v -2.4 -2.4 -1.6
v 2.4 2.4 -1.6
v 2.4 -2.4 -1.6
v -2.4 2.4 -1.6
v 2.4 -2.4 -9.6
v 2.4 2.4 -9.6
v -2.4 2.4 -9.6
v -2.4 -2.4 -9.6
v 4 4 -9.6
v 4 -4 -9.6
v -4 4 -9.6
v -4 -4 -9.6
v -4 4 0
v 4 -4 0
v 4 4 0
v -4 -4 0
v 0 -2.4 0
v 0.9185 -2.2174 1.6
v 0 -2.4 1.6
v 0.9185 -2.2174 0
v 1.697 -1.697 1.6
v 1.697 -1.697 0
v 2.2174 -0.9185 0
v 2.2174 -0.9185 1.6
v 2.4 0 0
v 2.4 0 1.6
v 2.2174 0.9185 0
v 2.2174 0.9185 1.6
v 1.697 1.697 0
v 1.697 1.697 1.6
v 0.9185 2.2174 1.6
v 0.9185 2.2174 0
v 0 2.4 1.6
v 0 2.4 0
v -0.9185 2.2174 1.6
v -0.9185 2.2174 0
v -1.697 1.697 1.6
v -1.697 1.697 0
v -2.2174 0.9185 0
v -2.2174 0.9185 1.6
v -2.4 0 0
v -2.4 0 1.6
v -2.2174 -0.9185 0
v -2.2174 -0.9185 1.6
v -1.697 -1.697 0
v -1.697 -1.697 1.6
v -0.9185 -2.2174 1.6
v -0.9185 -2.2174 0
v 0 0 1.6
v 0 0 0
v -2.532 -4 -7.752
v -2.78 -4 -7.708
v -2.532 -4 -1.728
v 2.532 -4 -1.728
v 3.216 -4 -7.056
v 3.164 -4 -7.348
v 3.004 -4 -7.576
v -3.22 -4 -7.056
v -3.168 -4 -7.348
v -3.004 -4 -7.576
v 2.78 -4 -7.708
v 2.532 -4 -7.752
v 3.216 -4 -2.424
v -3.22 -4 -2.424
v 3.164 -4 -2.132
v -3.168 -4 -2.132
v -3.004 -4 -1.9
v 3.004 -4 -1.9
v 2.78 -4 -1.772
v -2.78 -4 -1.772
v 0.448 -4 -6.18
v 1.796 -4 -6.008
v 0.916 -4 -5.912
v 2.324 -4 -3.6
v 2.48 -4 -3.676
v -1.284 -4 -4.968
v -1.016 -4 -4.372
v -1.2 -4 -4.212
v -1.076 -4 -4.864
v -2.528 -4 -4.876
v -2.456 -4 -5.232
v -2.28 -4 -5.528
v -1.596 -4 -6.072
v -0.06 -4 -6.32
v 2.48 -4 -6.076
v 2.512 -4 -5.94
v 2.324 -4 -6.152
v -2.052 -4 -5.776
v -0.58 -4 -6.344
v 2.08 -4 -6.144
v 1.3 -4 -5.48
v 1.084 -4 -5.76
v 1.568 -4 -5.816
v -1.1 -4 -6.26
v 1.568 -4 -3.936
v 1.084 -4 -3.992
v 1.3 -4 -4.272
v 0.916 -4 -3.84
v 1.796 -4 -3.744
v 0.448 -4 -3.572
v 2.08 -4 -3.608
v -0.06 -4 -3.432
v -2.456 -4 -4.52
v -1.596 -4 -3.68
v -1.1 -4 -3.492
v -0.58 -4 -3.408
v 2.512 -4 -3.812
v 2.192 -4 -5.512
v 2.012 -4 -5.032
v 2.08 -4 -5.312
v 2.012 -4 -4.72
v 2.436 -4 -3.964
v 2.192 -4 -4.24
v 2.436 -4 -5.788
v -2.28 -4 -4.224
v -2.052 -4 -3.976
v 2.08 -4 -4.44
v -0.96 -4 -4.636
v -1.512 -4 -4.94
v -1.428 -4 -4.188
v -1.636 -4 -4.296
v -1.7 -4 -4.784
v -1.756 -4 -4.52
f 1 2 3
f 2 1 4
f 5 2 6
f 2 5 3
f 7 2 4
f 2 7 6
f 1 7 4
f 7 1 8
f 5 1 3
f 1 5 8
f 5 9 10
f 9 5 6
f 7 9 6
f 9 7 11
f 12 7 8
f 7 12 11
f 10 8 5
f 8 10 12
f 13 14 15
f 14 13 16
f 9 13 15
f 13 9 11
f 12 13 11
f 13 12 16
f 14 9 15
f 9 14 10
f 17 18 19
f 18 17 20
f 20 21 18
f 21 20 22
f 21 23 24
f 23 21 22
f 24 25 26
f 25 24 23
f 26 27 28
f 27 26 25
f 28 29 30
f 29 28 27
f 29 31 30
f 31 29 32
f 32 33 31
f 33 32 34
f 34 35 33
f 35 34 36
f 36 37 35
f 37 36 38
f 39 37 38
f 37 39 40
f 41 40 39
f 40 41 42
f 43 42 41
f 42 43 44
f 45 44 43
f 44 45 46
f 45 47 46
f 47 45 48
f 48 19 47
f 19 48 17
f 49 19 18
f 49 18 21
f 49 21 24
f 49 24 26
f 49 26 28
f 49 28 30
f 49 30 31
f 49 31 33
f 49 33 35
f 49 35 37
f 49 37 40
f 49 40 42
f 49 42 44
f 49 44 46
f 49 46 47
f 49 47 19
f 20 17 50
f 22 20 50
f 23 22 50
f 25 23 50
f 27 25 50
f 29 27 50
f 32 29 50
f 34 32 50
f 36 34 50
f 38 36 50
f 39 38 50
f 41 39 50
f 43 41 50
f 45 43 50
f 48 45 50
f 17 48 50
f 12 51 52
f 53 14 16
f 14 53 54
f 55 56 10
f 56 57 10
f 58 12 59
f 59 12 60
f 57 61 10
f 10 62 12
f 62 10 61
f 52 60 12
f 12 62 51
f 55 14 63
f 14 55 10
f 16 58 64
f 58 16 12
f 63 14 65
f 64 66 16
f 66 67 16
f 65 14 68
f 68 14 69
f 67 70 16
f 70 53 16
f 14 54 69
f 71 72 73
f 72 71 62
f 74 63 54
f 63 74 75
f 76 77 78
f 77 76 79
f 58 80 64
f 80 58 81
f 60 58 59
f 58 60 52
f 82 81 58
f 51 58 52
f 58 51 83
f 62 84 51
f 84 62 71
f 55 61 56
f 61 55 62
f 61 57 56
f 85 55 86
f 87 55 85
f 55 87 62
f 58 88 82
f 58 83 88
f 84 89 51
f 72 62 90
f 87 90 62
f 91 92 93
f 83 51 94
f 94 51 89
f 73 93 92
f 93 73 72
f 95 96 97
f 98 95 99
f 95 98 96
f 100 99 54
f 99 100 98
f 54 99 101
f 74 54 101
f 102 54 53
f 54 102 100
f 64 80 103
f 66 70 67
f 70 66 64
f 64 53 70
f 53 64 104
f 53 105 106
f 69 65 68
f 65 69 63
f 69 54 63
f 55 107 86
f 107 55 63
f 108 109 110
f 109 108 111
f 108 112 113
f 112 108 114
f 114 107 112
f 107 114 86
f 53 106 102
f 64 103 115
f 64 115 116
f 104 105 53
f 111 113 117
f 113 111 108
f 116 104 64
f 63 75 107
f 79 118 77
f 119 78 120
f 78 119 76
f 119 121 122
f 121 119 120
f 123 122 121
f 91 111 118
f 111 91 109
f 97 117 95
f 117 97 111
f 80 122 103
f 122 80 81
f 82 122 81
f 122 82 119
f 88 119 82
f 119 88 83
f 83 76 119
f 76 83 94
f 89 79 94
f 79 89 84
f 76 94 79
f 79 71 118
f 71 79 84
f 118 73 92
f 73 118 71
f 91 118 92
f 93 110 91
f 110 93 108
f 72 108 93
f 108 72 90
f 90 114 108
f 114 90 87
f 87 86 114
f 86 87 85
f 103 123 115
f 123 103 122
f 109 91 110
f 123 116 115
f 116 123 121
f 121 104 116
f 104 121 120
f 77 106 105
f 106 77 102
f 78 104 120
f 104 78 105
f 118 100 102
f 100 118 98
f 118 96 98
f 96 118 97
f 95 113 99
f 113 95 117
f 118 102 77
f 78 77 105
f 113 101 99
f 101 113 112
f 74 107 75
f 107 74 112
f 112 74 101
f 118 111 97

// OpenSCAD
// file: ../p/4-4edge.scad
use <../lib.scad>
function ldraw_lib__4_4edge() = [
// 0 Circle 1.0
// 0 Name: 4-4edge.dat
// 0 Author: James Jessiman
// 0 !LDRAW_ORG Primitive UPDATE 2017-01
// 0 !LICENSE Licensed under CC BY 2.0 and CC BY 4.0 : see CAreadme.txt
// 
// 0 BFC CERTIFY CCW
  [0,"BFC","CERTIFY"],
  [0,"BFC","CCW"],
// 
// 0 !HISTORY 1998-12-15 [PTadmin] Official Update 1998-10
// 0 !HISTORY 2005-12-28 [PTadmin] Official Update 2005-01
// 0 !HISTORY 2007-06-24 [PTadmin] Header formatted for Contributor Agreement
// 0 !HISTORY 2008-07-01 [PTadmin] Official Update 2008-01
// 0 !HISTORY 2017-01-15 [Steffen] BFCed
// 0 !HISTORY 2017-12-30 [PTadmin] Official Update 2017-01
// 
// 
// 2 24 1 0 0 0.9239 0 0.3827
  [2,24,1,0,0,0.9239,0,0.3827],
// 2 24 0.9239 0 0.3827 0.7071 0 0.7071
  [2,24,0.9239,0,0.3827,0.7071,0,0.7071],
// 2 24 0.7071 0 0.7071 0.3827 0 0.9239
  [2,24,0.7071,0,0.7071,0.3827,0,0.9239],
// 2 24 0.3827 0 0.9239 0 0 1
  [2,24,0.3827,0,0.9239,0,0,1],
// 2 24 0 0 1 -0.3827 0 0.9239
  [2,24,0,0,1,-0.3827,0,0.9239],
// 2 24 -0.3827 0 0.9239 -0.7071 0 0.7071
  [2,24,-0.3827,0,0.9239,-0.7071,0,0.7071],
// 2 24 -0.7071 0 0.7071 -0.9239 0 0.3827
  [2,24,-0.7071,0,0.7071,-0.9239,0,0.3827],
// 2 24 -0.9239 0 0.3827 -1 0 -0
  [2,24,-0.9239,0,0.3827,-1,0,-0],
// 2 24 -1 0 -0 -0.9239 0 -0.3827
  [2,24,-1,0,-0,-0.9239,0,-0.3827],
// 2 24 -0.9239 0 -0.3827 -0.7071 0 -0.7071
  [2,24,-0.9239,0,-0.3827,-0.7071,0,-0.7071],
// 2 24 -0.7071 0 -0.7071 -0.3827 0 -0.9239
  [2,24,-0.7071,0,-0.7071,-0.3827,0,-0.9239],
// 2 24 -0.3827 0 -0.9239 0 0 -1
  [2,24,-0.3827,0,-0.9239,0,0,-1],
// 2 24 0 0 -1 0.3827 0 -0.9239
  [2,24,0,0,-1,0.3827,0,-0.9239],
// 2 24 0.3827 0 -0.9239 0.7071 0 -0.7071
  [2,24,0.3827,0,-0.9239,0.7071,0,-0.7071],
// 2 24 0.7071 0 -0.7071 0.9239 0 -0.3827
  [2,24,0.7071,0,-0.7071,0.9239,0,-0.3827],
// 2 24 0.9239 0 -0.3827 1 0 0
  [2,24,0.9239,0,-0.3827,1,0,0],
];
module ldraw_lib__4_4edge(step=0, col=false, unit=2/5, alt=false, line=0.2, solid=!$preview)
    makepoly(ldraw_lib__4_4edge(), step=step, col=col, unit=unit, alt=alt, line=line, solid=solid);
ldraw_lib__4_4edge(line=0.2);
// file: ../p/4-4disc.scad
use <../lib.scad>
function ldraw_lib__4_4disc() = [
// 0 Disc 1.0
// 0 Name: 4-4disc.dat
// 0 Author: James Jessiman
// 0 !LDRAW_ORG Primitive UPDATE 2002-02
// 0 !LICENSE Licensed under CC BY 2.0 and CC BY 4.0 : see CAreadme.txt
// 
// 0 BFC CERTIFY CCW
  [0,"BFC","CERTIFY"],
  [0,"BFC","CCW"],
// 
// 0 !HISTORY 1998-12-15 [PTadmin] Official Update 1998-10
// 0 !HISTORY 2002-03-23 [sbliss] Added BFC statement
// 0 !HISTORY 2002-04-25 [PTadmin] Official Update 2002-02
// 0 !HISTORY 2007-06-24 [PTadmin] Header formatted for Contributor Agreement
// 0 !HISTORY 2008-07-01 [PTadmin] Official Update 2008-01
// 
// 
// 3 16 0 0 0 1 0 0 0.9239 0 0.3827
  [3,16,0,0,0,1,0,0,0.9239,0,0.3827],
// 3 16 0 0 0 0.9239 0 0.3827 0.7071 0 0.7071
  [3,16,0,0,0,0.9239,0,0.3827,0.7071,0,0.7071],
// 3 16 0 0 0 0.7071 0 0.7071 0.3827 0 0.9239
  [3,16,0,0,0,0.7071,0,0.7071,0.3827,0,0.9239],
// 3 16 0 0 0 0.3827 0 0.9239 0 0 1
  [3,16,0,0,0,0.3827,0,0.9239,0,0,1],
// 3 16 0 0 0 0 0 1 -0.3827 0 0.9239
  [3,16,0,0,0,0,0,1,-0.3827,0,0.9239],
// 3 16 0 0 0 -0.3827 0 0.9239 -0.7071 0 0.7071
  [3,16,0,0,0,-0.3827,0,0.9239,-0.7071,0,0.7071],
// 3 16 0 0 0 -0.7071 0 0.7071 -0.9239 0 0.3827
  [3,16,0,0,0,-0.7071,0,0.7071,-0.9239,0,0.3827],
// 3 16 0 0 0 -0.9239 0 0.3827 -1 0 -0
  [3,16,0,0,0,-0.9239,0,0.3827,-1,0,-0],
// 3 16 0 0 0 -1 0 -0 -0.9239 0 -0.3827
  [3,16,0,0,0,-1,0,-0,-0.9239,0,-0.3827],
// 3 16 0 0 0 -0.9239 0 -0.3827 -0.7071 0 -0.7071
  [3,16,0,0,0,-0.9239,0,-0.3827,-0.7071,0,-0.7071],
// 3 16 0 0 0 -0.7071 0 -0.7071 -0.3827 0 -0.9239
  [3,16,0,0,0,-0.7071,0,-0.7071,-0.3827,0,-0.9239],
// 3 16 0 0 0 -0.3827 0 -0.9239 0 0 -1
  [3,16,0,0,0,-0.3827,0,-0.9239,0,0,-1],
// 3 16 0 0 0 0 0 -1 0.3827 0 -0.9239
  [3,16,0,0,0,0,0,-1,0.3827,0,-0.9239],
// 3 16 0 0 0 0.3827 0 -0.9239 0.7071 0 -0.7071
  [3,16,0,0,0,0.3827,0,-0.9239,0.7071,0,-0.7071],
// 3 16 0 0 0 0.7071 0 -0.7071 0.9239 0 -0.3827
  [3,16,0,0,0,0.7071,0,-0.7071,0.9239,0,-0.3827],
// 3 16 0 0 0 0.9239 0 -0.3827 1 0 0
  [3,16,0,0,0,0.9239,0,-0.3827,1,0,0],
// 0
];
module ldraw_lib__4_4disc(step=0, col=false, unit=2/5, alt=false, line=0.2, solid=!$preview)
    makepoly(ldraw_lib__4_4disc(), step=step, col=col, unit=unit, alt=alt, line=line, solid=solid);
ldraw_lib__4_4disc(line=0.2);
// file: ../p/4-4cyli.scad
use <../lib.scad>
$fa=1; $fs=0.2;
function ldraw_lib__4_4cyli(realsolid=false) = [
// 0 Cylinder 1.0
// 0 Name: 4-4cyli.dat
// 0 Author: James Jessiman
// 0 !LDRAW_ORG Primitive UPDATE 2005-01
// 0 !LICENSE Licensed under CC BY 2.0 and CC BY 4.0 : see CAreadme.txt
// 
// 0 BFC CERTIFY CCW
  [0,"BFC","CERTIFY"],
  [0,"BFC","CCW"],
// 
// 0 !HISTORY 1998-12-15 [PTadmin] Official Update 1998-10
// 0 !HISTORY 2002-03-23 [sbliss] Added BFC statement; merged headers from files in distributions LDraw 0.27 and Complete.
// 0 !HISTORY 2002-04-25 [PTadmin] Official Update 2002-02
// 0 !HISTORY 2004-12-14 [guyvivan] BFC CCW
// 0 !HISTORY 2005-12-28 [PTadmin] Official Update 2005-01
// 0 !HISTORY 2007-06-24 [PTadmin] Header formatted for Contributor Agreement
// 0 !HISTORY 2008-07-01 [PTadmin] Official Update 2008-01
// 
// 
// 4 16 1 1 0 0.9239 1 0.3827 0.9239 0 0.3827 1 0 0
  [4,16,1,1,0,0.9239,1,0.3827,0.9239,0,0.3827,1,0,0],
// 5 24 1 0 0 1 1 0 0.9239 0 0.3827 0.9239 0 -0.3827
  [5,24,1,0,0,1,1,0,0.9239,0,0.3827,0.9239,0,-0.3827],
// 4 16 0.9239 1 0.3827 0.7071 1 0.7071 0.7071 0 0.7071 0.9239 0 0.3827
  [4,16,0.9239,1,0.3827,0.7071,1,0.7071,0.7071,0,0.7071,0.9239,0,0.3827],
// 5 24 0.9239 0 0.3827 0.9239 1 0.3827 0.7071 0 0.7071 1 0 0
  [5,24,0.9239,0,0.3827,0.9239,1,0.3827,0.7071,0,0.7071,1,0,0],
// 4 16 0.7071 1 0.7071 0.3827 1 0.9239 0.3827 0 0.9239 0.7071 0 0.7071
  [4,16,0.7071,1,0.7071,0.3827,1,0.9239,0.3827,0,0.9239,0.7071,0,0.7071],
// 5 24 0.7071 0 0.7071 0.7071 1 0.7071 0.3827 0 0.9239 0.9239 0 0.3827
  [5,24,0.7071,0,0.7071,0.7071,1,0.7071,0.3827,0,0.9239,0.9239,0,0.3827],
// 4 16 0.3827 1 0.9239 0 1 1 0 0 1 0.3827 0 0.9239
  [4,16,0.3827,1,0.9239,0,1,1,0,0,1,0.3827,0,0.9239],
// 5 24 0.3827 0 0.9239 0.3827 1 0.9239 0 0 1 0.7071 0 0.7071
  [5,24,0.3827,0,0.9239,0.3827,1,0.9239,0,0,1,0.7071,0,0.7071],
// 4 16 0 1 1 -0.3827 1 0.9239 -0.3827 0 0.9239 0 0 1
  [4,16,0,1,1,-0.3827,1,0.9239,-0.3827,0,0.9239,0,0,1],
// 5 24 0 0 1 0 1 1 -0.3827 0 0.9239 0.3827 0 0.9239
  [5,24,0,0,1,0,1,1,-0.3827,0,0.9239,0.3827,0,0.9239],
// 4 16 -0.3827 1 0.9239 -0.7071 1 0.7071 -0.7071 0 0.7071 -0.3827 0 0.9239
  [4,16,-0.3827,1,0.9239,-0.7071,1,0.7071,-0.7071,0,0.7071,-0.3827,0,0.9239],
// 5 24 -0.3827 0 0.9239 -0.3827 1 0.9239 -0.7071 0 0.7071 0 0 1
  [5,24,-0.3827,0,0.9239,-0.3827,1,0.9239,-0.7071,0,0.7071,0,0,1],
// 4 16 -0.7071 1 0.7071 -0.9239 1 0.3827 -0.9239 0 0.3827 -0.7071 0 0.7071
  [4,16,-0.7071,1,0.7071,-0.9239,1,0.3827,-0.9239,0,0.3827,-0.7071,0,0.7071],
// 5 24 -0.7071 0 0.7071 -0.7071 1 0.7071 -0.9239 0 0.3827 -0.3827 0 0.9239
  [5,24,-0.7071,0,0.7071,-0.7071,1,0.7071,-0.9239,0,0.3827,-0.3827,0,0.9239],
// 4 16 -0.9239 1 0.3827 -1 1 0 -1 0 0 -0.9239 0 0.3827
  [4,16,-0.9239,1,0.3827,-1,1,0,-1,0,0,-0.9239,0,0.3827],
// 5 24 -0.9239 0 0.3827 -0.9239 1 0.3827 -1 0 0 -0.7071 0 0.7071
  [5,24,-0.9239,0,0.3827,-0.9239,1,0.3827,-1,0,0,-0.7071,0,0.7071],
// 4 16 -1 1 0 -0.9239 1 -0.3827 -0.9239 0 -0.3827 -1 0 0
  [4,16,-1,1,0,-0.9239,1,-0.3827,-0.9239,0,-0.3827,-1,0,0],
// 5 24 -1 0 0 -1 1 0 -0.9239 0 -0.3827 -0.9239 0 0.3827
  [5,24,-1,0,0,-1,1,0,-0.9239,0,-0.3827,-0.9239,0,0.3827],
// 4 16 -0.9239 1 -0.3827 -0.7071 1 -0.7071 -0.7071 0 -0.7071 -0.9239 0 -0.3827
  [4,16,-0.9239,1,-0.3827,-0.7071,1,-0.7071,-0.7071,0,-0.7071,-0.9239,0,-0.3827],
// 5 24 -0.9239 0 -0.3827 -0.9239 1 -0.3827 -0.7071 0 -0.7071 -1 0 0
  [5,24,-0.9239,0,-0.3827,-0.9239,1,-0.3827,-0.7071,0,-0.7071,-1,0,0],
// 4 16 -0.7071 1 -0.7071 -0.3827 1 -0.9239 -0.3827 0 -0.9239 -0.7071 0 -0.7071
  [4,16,-0.7071,1,-0.7071,-0.3827,1,-0.9239,-0.3827,0,-0.9239,-0.7071,0,-0.7071],
// 5 24 -0.7071 0 -0.7071 -0.7071 1 -0.7071 -0.3827 0 -0.9239 -0.9239 0 -0.3827
  [5,24,-0.7071,0,-0.7071,-0.7071,1,-0.7071,-0.3827,0,-0.9239,-0.9239,0,-0.3827],
// 4 16 -0.3827 1 -0.9239 0 1 -1 0 0 -1 -0.3827 0 -0.9239
  [4,16,-0.3827,1,-0.9239,0,1,-1,0,0,-1,-0.3827,0,-0.9239],
// 5 24 -0.3827 0 -0.9239 -0.3827 1 -0.9239 0 0 -1 -0.7071 0 -0.7071
  [5,24,-0.3827,0,-0.9239,-0.3827,1,-0.9239,0,0,-1,-0.7071,0,-0.7071],
// 4 16 0 1 -1 0.3827 1 -0.9239 0.3827 0 -0.9239 0 0 -1
  [4,16,0,1,-1,0.3827,1,-0.9239,0.3827,0,-0.9239,0,0,-1],
// 5 24 0 0 -1 0 1 -1 0.3827 0 -0.9239 -0.3827 0 -0.9239
  [5,24,0,0,-1,0,1,-1,0.3827,0,-0.9239,-0.3827,0,-0.9239],
// 4 16 0.3827 1 -0.9239 0.7071 1 -0.7071 0.7071 0 -0.7071 0.3827 0 -0.9239
  [4,16,0.3827,1,-0.9239,0.7071,1,-0.7071,0.7071,0,-0.7071,0.3827,0,-0.9239],
// 5 24 0.3827 0 -0.9239 0.3827 1 -0.9239 0.7071 0 -0.7071 0 0 -1
  [5,24,0.3827,0,-0.9239,0.3827,1,-0.9239,0.7071,0,-0.7071,0,0,-1],
// 4 16 0.7071 1 -0.7071 0.9239 1 -0.3827 0.9239 0 -0.3827 0.7071 0 -0.7071
  [4,16,0.7071,1,-0.7071,0.9239,1,-0.3827,0.9239,0,-0.3827,0.7071,0,-0.7071],
// 5 24 0.7071 0 -0.7071 0.7071 1 -0.7071 0.9239 0 -0.3827 0.3827 0 -0.9239
  [5,24,0.7071,0,-0.7071,0.7071,1,-0.7071,0.9239,0,-0.3827,0.3827,0,-0.9239],
// 4 16 0.9239 1 -0.3827 1 1 0 1 0 0 0.9239 0 -0.3827
  [4,16,0.9239,1,-0.3827,1,1,0,1,0,0,0.9239,0,-0.3827],
// 5 24 0.9239 0 -0.3827 0.9239 1 -0.3827 1 0 0 0.7071 0 -0.7071
  [5,24,0.9239,0,-0.3827,0.9239,1,-0.3827,1,0,0,0.7071,0,-0.7071],
// 0
];
module ldraw_lib__4_4cyli(step=0, col=false, unit=2/5, alt=false, line=0.2, solid=!$preview)
    makepoly(ldraw_lib__4_4cyli(solid), step=step, col=col, unit=unit, alt=alt, line=line, solid=solid);
ldraw_lib__4_4cyli(line=0.2);
// file: ../p/stud.scad
use <../lib.scad>
use <4-4cyli.scad>
use <4-4disc.scad>
use <4-4edge.scad>
function ldraw_lib__stud() = [
// 0 Stud
// 0 Name: stud.dat
// 0 Author: James Jessiman
// 0 !LDRAW_ORG Primitive UPDATE 2012-01
// 0 !LICENSE Licensed under CC BY 4.0 : see CAreadme.txt
// 
// 0 BFC CERTIFY CCW
  [0,"BFC","CERTIFY"],
  [0,"BFC","CCW"],
// 
// 0 !HISTORY 2002-04-04 [sbliss] Modified for BFC compliance
// 0 !HISTORY 2002-04-25 [PTadmin] Official Update 2002-02
// 0 !HISTORY 2007-06-24 [PTadmin] Header formatted for Contributor Agreement
// 0 !HISTORY 2008-07-01 [PTadmin] Official Update 2008-01
// 0 !HISTORY 2012-02-16 [Philo] Changed to CCW
// 0 !HISTORY 2012-03-30 [PTadmin] Official Update 2012-01
// 
// 
// 1 16 0 0 0 6 0 0 0 1 0 0 0 6 4-4edge.dat
  [1,16,0,0,0,6,0,0,0,1,0,0,0,6, ldraw_lib__4_4edge()],
// 1 16 0 -4 0 6 0 0 0 1 0 0 0 6 4-4edge.dat
  [1,16,0,-4,0,6,0,0,0,1,0,0,0,6, ldraw_lib__4_4edge()],
// 1 16 0 0 0 6 0 0 0 -4 0 0 0 6 4-4cyli.dat
  [1,16,0,0,0,6,0,0,0,-4,0,0,0,6, ldraw_lib__4_4cyli()],
// 1 16 0 -4 0 6 0 0 0 1 0 0 0 6 4-4disc.dat
  [1,16,0,-4,0,6,0,0,0,1,0,0,0,6, ldraw_lib__4_4disc()],
  [-1,16,0,0,0,6,0,0,0,-1,0,0,0,6, ldraw_lib__4_4disc()],
];
module ldraw_lib__stud(step=0, col=false, unit=2/5, alt=false, line=0.2, solid=!$preview)
    makepoly(ldraw_lib__stud(), step=step, col=col, unit=unit, alt=alt, line=line, solid=solid);
ldraw_lib__stud(line=0.2);
// file: ../p/box5.scad
use <../lib.scad>
function ldraw_lib__box5() = [
// 0 Box with 5 Faces and All Edges
// 0 Name: box5.dat
// 0 Author: James Jessiman
// 0 !LDRAW_ORG Primitive UPDATE 2012-01
// 0 !LICENSE Licensed under CC BY 2.0 and CC BY 4.0 : see CAreadme.txt
// 
// 0 BFC CERTIFY CCW
  [0,"BFC","CERTIFY"],
  [0,"BFC","CCW"],
// 
// 0 !HISTORY 2002-04-03 [sbliss] Modified for BFC compliance
// 0 !HISTORY 2002-04-25 [PTadmin] Official Update 2002-02
// 0 !HISTORY 2007-06-24 [PTadmin] Header formatted for Contributor Agreement
// 0 !HISTORY 2008-07-01 [PTadmin] Official Update 2008-01
// 0 !HISTORY 2012-02-16 [Philo] Changed to CCW
// 0 !HISTORY 2012-03-30 [PTadmin] Official Update 2012-01
// 
// 
// 2 24 1 1 1 -1 1 1
  [2,24,1,1,1,-1,1,1],
// 2 24 -1 1 1 -1 1 -1
  [2,24,-1,1,1,-1,1,-1],
// 2 24 -1 1 -1 1 1 -1
  [2,24,-1,1,-1,1,1,-1],
// 2 24 1 1 -1 1 1 1
  [2,24,1,1,-1,1,1,1],
// 2 24 1 0 1 -1 0 1
  [2,24,1,0,1,-1,0,1],
// 2 24 -1 0 1 -1 0 -1
  [2,24,-1,0,1,-1,0,-1],
// 2 24 -1 0 -1 1 0 -1
  [2,24,-1,0,-1,1,0,-1],
// 2 24 1 0 -1 1 0 1
  [2,24,1,0,-1,1,0,1],
// 2 24 1 0 1 1 1 1
  [2,24,1,0,1,1,1,1],
// 2 24 -1 0 1 -1 1 1
  [2,24,-1,0,1,-1,1,1],
// 2 24 1 0 -1 1 1 -1
  [2,24,1,0,-1,1,1,-1],
// 2 24 -1 0 -1 -1 1 -1
  [2,24,-1,0,-1,-1,1,-1],
// 4 16 -1 1 1 1 1 1 1 1 -1 -1 1 -1
  [4,16,-1,1,1,1,1,1,1,1,-1,-1,1,-1],
// 4 16 -1 1 1 -1 0 1 1 0 1 1 1 1
  [4,16,-1,1,1,-1,0,1,1,0,1,1,1,1],
// 4 16 -1 1 -1 -1 0 -1 -1 0 1 -1 1 1
  [4,16,-1,1,-1,-1,0,-1,-1,0,1,-1,1,1],
// 4 16 1 1 -1 1 0 -1 -1 0 -1 -1 1 -1
  [4,16,1,1,-1,1,0,-1,-1,0,-1,-1,1,-1],
// 4 16 1 1 1 1 0 1 1 0 -1 1 1 -1
  [4,16,1,1,1,1,0,1,1,0,-1,1,1,-1],
];
makepoly(ldraw_lib__box5(), line=0.2);
// file: ../p/box4t.scad
use <../lib.scad>
function ldraw_lib__box4t() = [
// 0 Box with 4 Adjacent Faces and All Edges
// 0 Name: box4t.dat
// 0 Author: Tore Eriksson [Tore_Eriksson]
// 0 !LDRAW_ORG Primitive UPDATE 2003-02
// 0 !LICENSE Licensed under CC BY 2.0 and CC BY 4.0 : see CAreadme.txt
// 
// 0 BFC CERTIFY CCW
  [0,"BFC","CERTIFY"],
  [0,"BFC","CCW"],
// 
// 0 !HISTORY 1997-09-29 [PTadmin] Official Update 1997-15
// 0 !HISTORY 2002-08-31 [izanette] Modified with WINDZ for BFC compliance
// 0 !HISTORY 2003-08-01 [PTadmin] Official Update 2003-02
// 0 !HISTORY 2007-06-24 [PTadmin] Header formatted for Contributor Agreement
// 0 !HISTORY 2008-07-01 [PTadmin] Official Update 2008-01
// 
// 
// 2 24 1 1 1 -1 1 1
  [2,24,1,1,1,-1,1,1],
// 2 24 -1 1 1 -1 1 -1
  [2,24,-1,1,1,-1,1,-1],
// 2 24 -1 1 -1 1 1 -1
  [2,24,-1,1,-1,1,1,-1],
// 2 24 1 1 -1 1 1 1
  [2,24,1,1,-1,1,1,1],
// 2 24 1 0 1 -1 0 1
  [2,24,1,0,1,-1,0,1],
// 2 24 -1 0 1 -1 0 -1
  [2,24,-1,0,1,-1,0,-1],
// 2 24 -1 0 -1 1 0 -1
  [2,24,-1,0,-1,1,0,-1],
// 2 24 1 0 -1 1 0 1
  [2,24,1,0,-1,1,0,1],
// 2 24 1 0 1 1 1 1
  [2,24,1,0,1,1,1,1],
// 2 24 -1 0 1 -1 1 1
  [2,24,-1,0,1,-1,1,1],
// 2 24 1 0 -1 1 1 -1
  [2,24,1,0,-1,1,1,-1],
// 2 24 -1 0 -1 -1 1 -1
  [2,24,-1,0,-1,-1,1,-1],
// 4 16 1 1 1 1 1 -1 -1 1 -1 -1 1 1
  [4,16,1,1,1,1,1,-1,-1,1,-1,-1,1,1],
// 4 16 1 1 1 -1 1 1 -1 0 1 1 0 1
  [4,16,1,1,1,-1,1,1,-1,0,1,1,0,1],
// 4 16 -1 1 1 -1 1 -1 -1 0 -1 -1 0 1
  [4,16,-1,1,1,-1,1,-1,-1,0,-1,-1,0,1],
// 0 4 16 -1 1 -1 -1 0 -1 1 0 -1 1 1 -1
// 4 16 1 1 -1 1 1 1 1 0 1 1 0 -1
  [4,16,1,1,-1,1,1,1,1,0,1,1,0,-1],
// 0
];
makepoly(ldraw_lib__box4t(), line=0.2);
// file: s/3005s01.scad
use <../../lib.scad>
use <../../p/box4t.scad>
use <../../p/box5.scad>
use <../../p/stud.scad>
function ldraw_lib__s__3005s01() = [
// 0 ~Brick  1 x  1 without Front Face
// 0 Name: s\3005s01.dat
// 0 Author: John Riley [jriley]
// 0 !LDRAW_ORG Subpart UPDATE 2004-01
// 0 !LICENSE Licensed under CC BY 2.0 and CC BY 4.0 : see CAreadme.txt
// 
// 0 BFC CERTIFY CCW
  [0,"BFC","CERTIFY"],
  [0,"BFC","CCW"],
// 
// 0 !HISTORY 2003-09-07 [jriley] BFCed & Subfiled
// 0 !HISTORY 2004-03-02 [PTadmin] Official Update 2004-01
// 0 !HISTORY 2007-08-29 [PTadmin] Header formatted for Contributor Agreement
// 0 !HISTORY 2008-07-01 [PTadmin] Official Update 2008-01
// 
// 
// 0 BFC INVERTNEXT
  [0,"BFC","INVERTNEXT"],
// 1 16 0 24 0 0 0 6 0 -20 0 -6 0 0 box5.dat
  [1,16,0,24,0,0,0,6,0,-20,0,-6,0,0, ldraw_lib__box5()],
// 4 16 10 24 -10 6 24 -6 6 24 6 10 24 10
  [4,16,10,24,-10,6,24,-6,6,24,6,10,24,10],
// 4 16 10 24 10 6 24 6 -6 24 6 -10 24 10
  [4,16,10,24,10,6,24,6,-6,24,6,-10,24,10],
// 4 16 -10 24 10 -6 24 6 -6 24 -6 -10 24 -10
  [4,16,-10,24,10,-6,24,6,-6,24,-6,-10,24,-10],
// 4 16 -10 24 -10 -6 24 -6 6 24 -6 10 24 -10
  [4,16,-10,24,-10,-6,24,-6,6,24,-6,10,24,-10],
// 1 16 0 24 0 10 0 0 0 -24 0 0 0 10 box4t.dat
  [1,16,0,24,0,10,0,0,0,-24,0,0,0,10, ldraw_lib__box4t()],
// 1 16 0 0 0 0 0 1 0 1 0 -1 0 0 stud.dat
  [1,16,0,0,0,0,0,1,0,1,0,-1,0,0, ldraw_lib__stud()],
// 0
];
module ldraw_lib__s__3005s01(step=0, col=false, unit=2/5, alt=false, line=0.2, solid=!$preview)
    makepoly(ldraw_lib__s__3005s01(), step=step, col=col, unit=unit, alt=alt, line=line, solid=solid);
ldraw_lib__s__3005s01(line=0.2);
// main file
use <../lib.scad>
use <s/3005s01.scad>
function ldraw_lib__3005pf4() = [
// 0 Brick  1 x  1 with Dark Azure Fish on Light Blue Square Pattern
// 0 Name: 3005pf4.dat
// 0 Author: Philippe Hurbain [Philo]
// 0 !LDRAW_ORG Part UPDATE 2024-07
// 0 !LICENSE Licensed under CC BY 4.0 : see CAreadme.txt
// 
// 0 BFC CERTIFY CCW
  [0,"BFC","CERTIFY"],
  [0,"BFC","CCW"],
// 
// 0 !KEYWORDS Animal Crossing, Bait, Bricklink 3005pb065, Rebrickable 3005pr0040
// 0 !KEYWORDS set 77050
// 
// 0 !HISTORY 2024-08-26 [OrionP] Official Update 2024-07
// 
// 1 16 0 0 0 1 0 0 0 1 0 0 0 1 s\3005s01.dat
  [1,16,0,0,0,1,0,0,0,1,0,0,0,1, ldraw_lib__s__3005s01()],
// 3 16 -10 24 -10 -6.33 19.38 -10 -6.95 19.27 -10
  [3,16,-10,24,-10,-6.33,19.38,-10,-6.95,19.27,-10],
// 4 16 -10 0 -10 -6.33 4.32 -10 6.33 4.32 -10 10 0 -10
  [4,16,-10,0,-10,-6.33,4.32,-10,6.33,4.32,-10,10,0,-10],
// 3 16 8.04 17.64 -10 7.91 18.37 -10 10 24 -10
  [3,16,8.04,17.64,-10,7.91,18.37,-10,10,24,-10],
// 3 16 7.91 18.37 -10 7.51 18.94 -10 10 24 -10
  [3,16,7.91,18.37,-10,7.51,18.94,-10,10,24,-10],
// 3 16 -8.05 17.64 -10 -10 24 -10 -7.92 18.37 -10
  [3,16,-8.05,17.64,-10,-10,24,-10,-7.92,18.37,-10],
// 3 16 -7.92 18.37 -10 -10 24 -10 -7.51 18.94 -10
  [3,16,-7.92,18.37,-10,-10,24,-10,-7.51,18.94,-10],
// 3 16 7.51 18.94 -10 6.95 19.27 -10 10 24 -10
  [3,16,7.51,18.94,-10,6.95,19.27,-10,10,24,-10],
// 4 16 10 24 -10 6.95 19.27 -10 6.33 19.38 -10 -10 24 -10
  [4,16,10,24,-10,6.95,19.27,-10,6.33,19.38,-10,-10,24,-10],
// 3 16 -6.95 19.27 -10 -7.51 18.94 -10 -10 24 -10
  [3,16,-6.95,19.27,-10,-7.51,18.94,-10,-10,24,-10],
// 3 16 -10 24 -10 6.33 19.38 -10 -6.33 19.38 -10
  [3,16,-10,24,-10,6.33,19.38,-10,-6.33,19.38,-10],
// 4 16 10 0 -10 8.04 6.06 -10 8.04 17.64 -10 10 24 -10
  [4,16,10,0,-10,8.04,6.06,-10,8.04,17.64,-10,10,24,-10],
// 4 16 -10 0 -10 -10 24 -10 -8.05 17.64 -10 -8.05 6.06 -10
  [4,16,-10,0,-10,-10,24,-10,-8.05,17.64,-10,-8.05,6.06,-10],
// 3 16 8.04 6.06 -10 10 0 -10 7.91 5.33 -10
  [3,16,8.04,6.06,-10,10,0,-10,7.91,5.33,-10],
// 3 16 -8.05 6.06 -10 -7.92 5.33 -10 -10 0 -10
  [3,16,-8.05,6.06,-10,-7.92,5.33,-10,-10,0,-10],
// 3 16 -7.92 5.33 -10 -7.51 4.75 -10 -10 0 -10
  [3,16,-7.92,5.33,-10,-7.51,4.75,-10,-10,0,-10],
// 3 16 7.91 5.33 -10 10 0 -10 7.51 4.75 -10
  [3,16,7.91,5.33,-10,10,0,-10,7.51,4.75,-10],
// 3 16 7.51 4.75 -10 10 0 -10 6.95 4.43 -10
  [3,16,7.51,4.75,-10,10,0,-10,6.95,4.43,-10],
// 3 16 -7.51 4.75 -10 -6.95 4.43 -10 -10 0 -10
  [3,16,-7.51,4.75,-10,-6.95,4.43,-10,-10,0,-10],
// 3 16 -6.95 4.43 -10 -6.33 4.32 -10 -10 0 -10
  [3,16,-6.95,4.43,-10,-6.33,4.32,-10,-10,0,-10],
// 3 16 10 0 -10 6.33 4.32 -10 6.95 4.43 -10
  [3,16,10,0,-10,6.33,4.32,-10,6.95,4.43,-10],
// 4 9 4.49 15.02 -10 2.29 14.78 -10 1.12 15.45 -10 6.33 19.38 -10
  [4,9,4.49,15.02,-10,2.29,14.78,-10,1.12,15.45,-10,6.33,19.38,-10],
// 4 9 5.81 9 -10 6.2 9.19 -10 8.04 6.06 -10 6.33 4.32 -10
  [4,9,5.81,9,-10,6.2,9.19,-10,8.04,6.06,-10,6.33,4.32,-10],
// 4 9 -3 10.53 -10 -3.21 12.42 -10 -2.69 12.16 -10 -2.54 10.93 -10
  [4,9,-3,10.53,-10,-3.21,12.42,-10,-2.69,12.16,-10,-2.54,10.93,-10],
// 4 9 -8.05 17.64 -10 -6.14 13.08 -10 -6.32 12.19 -10 -8.05 6.06 -10
  [4,9,-8.05,17.64,-10,-6.14,13.08,-10,-6.32,12.19,-10,-8.05,6.06,-10],
// 4 9 -6.95 19.27 -10 -8.05 17.64 -10 -7.92 18.37 -10 -7.51 18.94 -10
  [4,9,-6.95,19.27,-10,-8.05,17.64,-10,-7.92,18.37,-10,-7.51,18.94,-10],
// 3 9 -5.7 13.82 -10 -6.14 13.08 -10 -8.05 17.64 -10
  [3,9,-5.7,13.82,-10,-6.14,13.08,-10,-8.05,17.64,-10],
// 4 9 -8.05 17.64 -10 -6.95 19.27 -10 -6.33 19.38 -10 -3.99 15.18 -10
  [4,9,-8.05,17.64,-10,-6.95,19.27,-10,-6.33,19.38,-10,-3.99,15.18,-10],
// 4 9 -.15 15.8 -10 -6.33 19.38 -10 6.33 19.38 -10 1.12 15.45 -10
  [4,9,-.15,15.8,-10,-6.33,19.38,-10,6.33,19.38,-10,1.12,15.45,-10],
// 4 9 8.04 17.64 -10 6.33 19.38 -10 6.95 19.27 -10 7.91 18.37 -10
  [4,9,8.04,17.64,-10,6.33,19.38,-10,6.95,19.27,-10,7.91,18.37,-10],
// 3 9 6.95 19.27 -10 7.51 18.94 -10 7.91 18.37 -10
  [3,9,6.95,19.27,-10,7.51,18.94,-10,7.91,18.37,-10],
// 3 9 6.2 15.19 -10 8.04 17.64 -10 6.28 14.85 -10
  [3,9,6.2,15.19,-10,8.04,17.64,-10,6.28,14.85,-10],
// 4 9 8.04 17.64 -10 6.2 15.19 -10 5.81 15.38 -10 6.33 19.38 -10
  [4,9,8.04,17.64,-10,6.2,15.19,-10,5.81,15.38,-10,6.33,19.38,-10],
// 3 9 -8.05 17.64 -10 -5.13 14.44 -10 -5.7 13.82 -10
  [3,9,-8.05,17.64,-10,-5.13,14.44,-10,-5.7,13.82,-10],
// 3 9 -8.05 17.64 -10 -3.99 15.18 -10 -5.13 14.44 -10
  [3,9,-8.05,17.64,-10,-3.99,15.18,-10,-5.13,14.44,-10],
// 3 9 -.15 15.8 -10 -1.45 15.86 -10 -6.33 19.38 -10
  [3,9,-.15,15.8,-10,-1.45,15.86,-10,-6.33,19.38,-10],
// 3 9 4.49 15.02 -10 6.33 19.38 -10 5.2 15.36 -10
  [3,9,4.49,15.02,-10,6.33,19.38,-10,5.2,15.36,-10],
// 3 9 5.81 15.38 -10 5.2 15.36 -10 6.33 19.38 -10
  [3,9,5.81,15.38,-10,5.2,15.36,-10,6.33,19.38,-10],
// 3 9 3.25 13.7 -10 2.71 14.4 -10 3.92 14.54 -10
  [3,9,3.25,13.7,-10,2.71,14.4,-10,3.92,14.54,-10],
// 3 9 -3.99 15.18 -10 -6.33 19.38 -10 -2.75 15.65 -10
  [3,9,-3.99,15.18,-10,-6.33,19.38,-10,-2.75,15.65,-10],
// 3 9 -2.75 15.65 -10 -6.33 19.38 -10 -1.45 15.86 -10
  [3,9,-2.75,15.65,-10,-6.33,19.38,-10,-1.45,15.86,-10],
// 4 9 2.29 14.78 -10 4.49 15.02 -10 3.92 14.54 -10 2.71 14.4 -10
  [4,9,2.29,14.78,-10,4.49,15.02,-10,3.92,14.54,-10,2.71,14.4,-10],
// 3 9 3.92 9.84 -10 2.71 9.98 -10 3.25 10.68 -10
  [3,9,3.92,9.84,-10,2.71,9.98,-10,3.25,10.68,-10],
// 4 9 2.29 9.6 -10 2.71 9.98 -10 3.92 9.84 -10 4.49 9.36 -10
  [4,9,2.29,9.6,-10,2.71,9.98,-10,3.92,9.84,-10,4.49,9.36,-10],
// 4 9 1.12 8.93 -10 2.29 9.6 -10 4.49 9.36 -10 6.33 4.32 -10
  [4,9,1.12,8.93,-10,2.29,9.6,-10,4.49,9.36,-10,6.33,4.32,-10],
// 3 9 6.33 4.32 -10 4.49 9.36 -10 5.2 9.02 -10
  [3,9,6.33,4.32,-10,4.49,9.36,-10,5.2,9.02,-10],
// 3 9 5.81 9 -10 6.33 4.32 -10 5.2 9.02 -10
  [3,9,5.81,9,-10,6.33,4.32,-10,5.2,9.02,-10],
// 4 9 -.15 8.58 -10 1.12 8.93 -10 6.33 4.32 -10 -6.33 4.32 -10
  [4,9,-.15,8.58,-10,1.12,8.93,-10,6.33,4.32,-10,-6.33,4.32,-10],
// 3 9 -8.05 6.06 -10 -6.32 12.19 -10 -6.14 11.3 -10
  [3,9,-8.05,6.06,-10,-6.32,12.19,-10,-6.14,11.3,-10],
// 4 9 -7.92 5.33 -10 -8.05 6.06 -10 -6.95 4.43 -10 -7.51 4.75 -10
  [4,9,-7.92,5.33,-10,-8.05,6.06,-10,-6.95,4.43,-10,-7.51,4.75,-10],
// 4 9 -6.33 4.32 -10 -6.95 4.43 -10 -8.05 6.06 -10 -3.99 9.2 -10
  [4,9,-6.33,4.32,-10,-6.95,4.43,-10,-8.05,6.06,-10,-3.99,9.2,-10],
// 3 9 -6.33 4.32 -10 -2.75 8.73 -10 -1.45 8.52 -10
  [3,9,-6.33,4.32,-10,-2.75,8.73,-10,-1.45,8.52,-10],
// 4 9 7.91 5.33 -10 7.51 4.75 -10 6.95 4.43 -10 8.04 6.06 -10
  [4,9,7.91,5.33,-10,7.51,4.75,-10,6.95,4.43,-10,8.04,6.06,-10],
// 3 9 6.95 4.43 -10 6.33 4.32 -10 8.04 6.06 -10
  [3,9,6.95,4.43,-10,6.33,4.32,-10,8.04,6.06,-10],
// 4 9 6.28 9.53 -10 6.28 14.85 -10 8.04 17.64 -10 8.04 6.06 -10
  [4,9,6.28,9.53,-10,6.28,14.85,-10,8.04,17.64,-10,8.04,6.06,-10],
// 4 9 5.03 12.58 -10 5.2 13.28 -10 5.48 13.78 -10 5.03 11.8 -10
  [4,9,5.03,12.58,-10,5.2,13.28,-10,5.48,13.78,-10,5.03,11.8,-10],
// 4 9 5.48 13.78 -10 6.09 14.47 -10 6.09 9.91 -10 5.48 10.6 -10
  [4,9,5.48,13.78,-10,6.09,14.47,-10,6.09,9.91,-10,5.48,10.6,-10],
// 4 9 6.09 14.47 -10 6.28 14.85 -10 6.28 9.53 -10 6.09 9.91 -10
  [4,9,6.09,14.47,-10,6.28,14.85,-10,6.28,9.53,-10,6.09,9.91,-10],
// 3 9 -6.33 4.32 -10 -1.45 8.52 -10 -.15 8.58 -10
  [3,9,-6.33,4.32,-10,-1.45,8.52,-10,-.15,8.58,-10],
// 3 9 -8.05 6.06 -10 -6.14 11.3 -10 -5.7 10.56 -10
  [3,9,-8.05,6.06,-10,-6.14,11.3,-10,-5.7,10.56,-10],
// 3 9 -8.05 6.06 -10 -5.7 10.56 -10 -5.13 9.94 -10
  [3,9,-8.05,6.06,-10,-5.7,10.56,-10,-5.13,9.94,-10],
// 3 9 -3.99 9.2 -10 -2.75 8.73 -10 -6.33 4.32 -10
  [3,9,-3.99,9.2,-10,-2.75,8.73,-10,-6.33,4.32,-10],
// 4 9 5.48 10.6 -10 5.2 11.1 -10 5.03 11.8 -10 5.48 13.78 -10
  [4,9,5.48,10.6,-10,5.2,11.1,-10,5.03,11.8,-10,5.48,13.78,-10],
// 3 9 -5.13 9.94 -10 -3.99 9.2 -10 -8.05 6.06 -10
  [3,9,-5.13,9.94,-10,-3.99,9.2,-10,-8.05,6.06,-10],
// 3 9 8.04 6.06 -10 6.2 9.19 -10 6.28 9.53 -10
  [3,9,8.04,6.06,-10,6.2,9.19,-10,6.28,9.53,-10],
// 3 9 -2.69 12.16 -10 -2.4 11.59 -10 -2.54 10.93 -10
  [3,9,-2.69,12.16,-10,-2.4,11.59,-10,-2.54,10.93,-10],
// 4 9 -3.21 12.42 -10 -3 10.53 -10 -3.57 10.47 -10 -3.78 12.35 -10
  [4,9,-3.21,12.42,-10,-3,10.53,-10,-3.57,10.47,-10,-3.78,12.35,-10],
// 4 9 -3.78 12.35 -10 -3.57 10.47 -10 -4.09 10.74 -10 -4.25 11.96 -10
  [4,9,-3.78,12.35,-10,-3.57,10.47,-10,-4.09,10.74,-10,-4.25,11.96,-10],
// 3 9 -4.39 11.3 -10 -4.25 11.96 -10 -4.09 10.74 -10
  [3,9,-4.39,11.3,-10,-4.25,11.96,-10,-4.09,10.74,-10],
// 4 321 3.25 13.7 -10 5.03 12.58 -10 5.03 11.8 -10 -2.4 11.59 -10
  [4,321,3.25,13.7,-10,5.03,12.58,-10,5.03,11.8,-10,-2.4,11.59,-10],
// 4 321 3.25 10.68 -10 5.03 11.8 -10 5.2 11.1 -10 3.92 9.84 -10
  [4,321,3.25,10.68,-10,5.03,11.8,-10,5.2,11.1,-10,3.92,9.84,-10],
// 4 321 -4.25 11.96 -10 -6.14 11.3 -10 -6.32 12.19 -10 -6.14 13.08 -10
  [4,321,-4.25,11.96,-10,-6.14,11.3,-10,-6.32,12.19,-10,-6.14,13.08,-10],
// 4 321 -4.25 11.96 -10 -6.14 13.08 -10 -5.7 13.82 -10 -3.78 12.35 -10
  [4,321,-4.25,11.96,-10,-6.14,13.08,-10,-5.7,13.82,-10,-3.78,12.35,-10],
// 4 321 -3.78 12.35 -10 -5.7 13.82 -10 -5.13 14.44 -10 -3.99 15.18 -10
  [4,321,-3.78,12.35,-10,-5.7,13.82,-10,-5.13,14.44,-10,-3.99,15.18,-10],
// 4 321 -3.99 15.18 -10 -2.75 15.65 -10 -3.21 12.42 -10 -3.78 12.35 -10
  [4,321,-3.99,15.18,-10,-2.75,15.65,-10,-3.21,12.42,-10,-3.78,12.35,-10],
// 4 321 -2.69 12.16 -10 -2.75 15.65 -10 -1.45 15.86 -10 -0.15 15.8 -10
  [4,321,-2.69,12.16,-10,-2.75,15.65,-10,-1.45,15.86,-10,-0.15,15.8,-10],
// 3 321 -3.21 12.42 -10 -2.75 15.65 -10 -2.69 12.16 -10
  [3,321,-3.21,12.42,-10,-2.75,15.65,-10,-2.69,12.16,-10],
// 4 321 -2.69 12.16 -10 -0.15 15.8 -10 1.12 15.45 -10 -2.4 11.59 -10
  [4,321,-2.69,12.16,-10,-0.15,15.8,-10,1.12,15.45,-10,-2.4,11.59,-10],
// 4 321 -2.4 11.59 -10 1.12 15.45 -10 2.29 14.78 -10 2.71 14.4 -10
  [4,321,-2.4,11.59,-10,1.12,15.45,-10,2.29,14.78,-10,2.71,14.4,-10],
// 3 321 3.25 13.7 -10 -2.4 11.59 -10 2.71 14.4 -10
  [3,321,3.25,13.7,-10,-2.4,11.59,-10,2.71,14.4,-10],
// 4 321 5.2 13.28 -10 3.25 13.7 -10 3.92 14.54 -10 5.48 13.78 -10
  [4,321,5.2,13.28,-10,3.25,13.7,-10,3.92,14.54,-10,5.48,13.78,-10],
// 4 321 5.48 13.78 -10 3.92 14.54 -10 4.49 15.02 -10 5.2 15.36 -10
  [4,321,5.48,13.78,-10,3.92,14.54,-10,4.49,15.02,-10,5.2,15.36,-10],
// 4 321 5.2 15.36 -10 5.81 15.38 -10 6.09 14.47 -10 5.48 13.78 -10
  [4,321,5.2,15.36,-10,5.81,15.38,-10,6.09,14.47,-10,5.48,13.78,-10],
// 4 321 5.81 15.38 -10 6.2 15.19 -10 6.28 14.85 -10 6.09 14.47 -10
  [4,321,5.81,15.38,-10,6.2,15.19,-10,6.28,14.85,-10,6.09,14.47,-10],
// 4 321 -6.14 11.3 -10 -4.25 11.96 -10 -4.39 11.3 -10 -5.7 10.56 -10
  [4,321,-6.14,11.3,-10,-4.25,11.96,-10,-4.39,11.3,-10,-5.7,10.56,-10],
// 3 321 5.03 12.58 -10 3.25 13.7 -10 5.2 13.28 -10
  [3,321,5.03,12.58,-10,3.25,13.7,-10,5.2,13.28,-10],
// 4 321 -5.13 9.94 -10 -5.7 10.56 -10 -4.39 11.3 -10 -4.09 10.74 -10
  [4,321,-5.13,9.94,-10,-5.7,10.56,-10,-4.39,11.3,-10,-4.09,10.74,-10],
// 4 321 -3.99 9.2 -10 -5.13 9.94 -10 -4.09 10.74 -10 -3.57 10.47 -10
  [4,321,-3.99,9.2,-10,-5.13,9.94,-10,-4.09,10.74,-10,-3.57,10.47,-10],
// 4 321 -1.45 8.52 -10 -2.75 8.73 -10 -2.54 10.93 -10 -0.15 8.58 -10
  [4,321,-1.45,8.52,-10,-2.75,8.73,-10,-2.54,10.93,-10,-0.15,8.58,-10],
// 4 321 -3 10.53 -10 -2.75 8.73 -10 -3.99 9.2 -10 -3.57 10.47 -10
  [4,321,-3,10.53,-10,-2.75,8.73,-10,-3.99,9.2,-10,-3.57,10.47,-10],
// 4 321 1.12 8.93 -10 -0.15 8.58 -10 -2.4 11.59 -10 2.29 9.6 -10
  [4,321,1.12,8.93,-10,-0.15,8.58,-10,-2.4,11.59,-10,2.29,9.6,-10],
// 4 321 2.71 9.98 -10 2.29 9.6 -10 -2.4 11.59 -10 3.25 10.68 -10
  [4,321,2.71,9.98,-10,2.29,9.6,-10,-2.4,11.59,-10,3.25,10.68,-10],
// 4 321 5.48 10.6 -10 4.49 9.36 -10 3.92 9.84 -10 5.2 11.1 -10
  [4,321,5.48,10.6,-10,4.49,9.36,-10,3.92,9.84,-10,5.2,11.1,-10],
// 3 321 -2.4 11.59 -10 -0.15 8.58 -10 -2.54 10.93 -10
  [3,321,-2.4,11.59,-10,-0.15,8.58,-10,-2.54,10.93,-10],
// 3 321 -3 10.53 -10 -2.54 10.93 -10 -2.75 8.73 -10
  [3,321,-3,10.53,-10,-2.54,10.93,-10,-2.75,8.73,-10],
// 4 321 5.2 9.02 -10 4.49 9.36 -10 5.48 10.6 -10 6.09 9.91 -10
  [4,321,5.2,9.02,-10,4.49,9.36,-10,5.48,10.6,-10,6.09,9.91,-10],
// 4 321 6.28 9.53 -10 6.2 9.19 -10 5.81 9 -10 6.09 9.91 -10
  [4,321,6.28,9.53,-10,6.2,9.19,-10,5.81,9,-10,6.09,9.91,-10],
// 3 321 6.09 9.91 -10 5.81 9 -10 5.2 9.02 -10
  [3,321,6.09,9.91,-10,5.81,9,-10,5.2,9.02,-10],
// 3 321 -2.4 11.59 -10 5.03 11.8 -10 3.25 10.68 -10
  [3,321,-2.4,11.59,-10,5.03,11.8,-10,3.25,10.68,-10],
];
module ldraw_lib__3005pf4(step=0, col=false, unit=2/5, alt=false, line=0.2, solid=!$preview)
    makepoly(ldraw_lib__3005pf4(), step=step, col=col, unit=unit, alt=alt, line=line, solid=solid);
ldraw_lib__3005pf4(line=0.2);
